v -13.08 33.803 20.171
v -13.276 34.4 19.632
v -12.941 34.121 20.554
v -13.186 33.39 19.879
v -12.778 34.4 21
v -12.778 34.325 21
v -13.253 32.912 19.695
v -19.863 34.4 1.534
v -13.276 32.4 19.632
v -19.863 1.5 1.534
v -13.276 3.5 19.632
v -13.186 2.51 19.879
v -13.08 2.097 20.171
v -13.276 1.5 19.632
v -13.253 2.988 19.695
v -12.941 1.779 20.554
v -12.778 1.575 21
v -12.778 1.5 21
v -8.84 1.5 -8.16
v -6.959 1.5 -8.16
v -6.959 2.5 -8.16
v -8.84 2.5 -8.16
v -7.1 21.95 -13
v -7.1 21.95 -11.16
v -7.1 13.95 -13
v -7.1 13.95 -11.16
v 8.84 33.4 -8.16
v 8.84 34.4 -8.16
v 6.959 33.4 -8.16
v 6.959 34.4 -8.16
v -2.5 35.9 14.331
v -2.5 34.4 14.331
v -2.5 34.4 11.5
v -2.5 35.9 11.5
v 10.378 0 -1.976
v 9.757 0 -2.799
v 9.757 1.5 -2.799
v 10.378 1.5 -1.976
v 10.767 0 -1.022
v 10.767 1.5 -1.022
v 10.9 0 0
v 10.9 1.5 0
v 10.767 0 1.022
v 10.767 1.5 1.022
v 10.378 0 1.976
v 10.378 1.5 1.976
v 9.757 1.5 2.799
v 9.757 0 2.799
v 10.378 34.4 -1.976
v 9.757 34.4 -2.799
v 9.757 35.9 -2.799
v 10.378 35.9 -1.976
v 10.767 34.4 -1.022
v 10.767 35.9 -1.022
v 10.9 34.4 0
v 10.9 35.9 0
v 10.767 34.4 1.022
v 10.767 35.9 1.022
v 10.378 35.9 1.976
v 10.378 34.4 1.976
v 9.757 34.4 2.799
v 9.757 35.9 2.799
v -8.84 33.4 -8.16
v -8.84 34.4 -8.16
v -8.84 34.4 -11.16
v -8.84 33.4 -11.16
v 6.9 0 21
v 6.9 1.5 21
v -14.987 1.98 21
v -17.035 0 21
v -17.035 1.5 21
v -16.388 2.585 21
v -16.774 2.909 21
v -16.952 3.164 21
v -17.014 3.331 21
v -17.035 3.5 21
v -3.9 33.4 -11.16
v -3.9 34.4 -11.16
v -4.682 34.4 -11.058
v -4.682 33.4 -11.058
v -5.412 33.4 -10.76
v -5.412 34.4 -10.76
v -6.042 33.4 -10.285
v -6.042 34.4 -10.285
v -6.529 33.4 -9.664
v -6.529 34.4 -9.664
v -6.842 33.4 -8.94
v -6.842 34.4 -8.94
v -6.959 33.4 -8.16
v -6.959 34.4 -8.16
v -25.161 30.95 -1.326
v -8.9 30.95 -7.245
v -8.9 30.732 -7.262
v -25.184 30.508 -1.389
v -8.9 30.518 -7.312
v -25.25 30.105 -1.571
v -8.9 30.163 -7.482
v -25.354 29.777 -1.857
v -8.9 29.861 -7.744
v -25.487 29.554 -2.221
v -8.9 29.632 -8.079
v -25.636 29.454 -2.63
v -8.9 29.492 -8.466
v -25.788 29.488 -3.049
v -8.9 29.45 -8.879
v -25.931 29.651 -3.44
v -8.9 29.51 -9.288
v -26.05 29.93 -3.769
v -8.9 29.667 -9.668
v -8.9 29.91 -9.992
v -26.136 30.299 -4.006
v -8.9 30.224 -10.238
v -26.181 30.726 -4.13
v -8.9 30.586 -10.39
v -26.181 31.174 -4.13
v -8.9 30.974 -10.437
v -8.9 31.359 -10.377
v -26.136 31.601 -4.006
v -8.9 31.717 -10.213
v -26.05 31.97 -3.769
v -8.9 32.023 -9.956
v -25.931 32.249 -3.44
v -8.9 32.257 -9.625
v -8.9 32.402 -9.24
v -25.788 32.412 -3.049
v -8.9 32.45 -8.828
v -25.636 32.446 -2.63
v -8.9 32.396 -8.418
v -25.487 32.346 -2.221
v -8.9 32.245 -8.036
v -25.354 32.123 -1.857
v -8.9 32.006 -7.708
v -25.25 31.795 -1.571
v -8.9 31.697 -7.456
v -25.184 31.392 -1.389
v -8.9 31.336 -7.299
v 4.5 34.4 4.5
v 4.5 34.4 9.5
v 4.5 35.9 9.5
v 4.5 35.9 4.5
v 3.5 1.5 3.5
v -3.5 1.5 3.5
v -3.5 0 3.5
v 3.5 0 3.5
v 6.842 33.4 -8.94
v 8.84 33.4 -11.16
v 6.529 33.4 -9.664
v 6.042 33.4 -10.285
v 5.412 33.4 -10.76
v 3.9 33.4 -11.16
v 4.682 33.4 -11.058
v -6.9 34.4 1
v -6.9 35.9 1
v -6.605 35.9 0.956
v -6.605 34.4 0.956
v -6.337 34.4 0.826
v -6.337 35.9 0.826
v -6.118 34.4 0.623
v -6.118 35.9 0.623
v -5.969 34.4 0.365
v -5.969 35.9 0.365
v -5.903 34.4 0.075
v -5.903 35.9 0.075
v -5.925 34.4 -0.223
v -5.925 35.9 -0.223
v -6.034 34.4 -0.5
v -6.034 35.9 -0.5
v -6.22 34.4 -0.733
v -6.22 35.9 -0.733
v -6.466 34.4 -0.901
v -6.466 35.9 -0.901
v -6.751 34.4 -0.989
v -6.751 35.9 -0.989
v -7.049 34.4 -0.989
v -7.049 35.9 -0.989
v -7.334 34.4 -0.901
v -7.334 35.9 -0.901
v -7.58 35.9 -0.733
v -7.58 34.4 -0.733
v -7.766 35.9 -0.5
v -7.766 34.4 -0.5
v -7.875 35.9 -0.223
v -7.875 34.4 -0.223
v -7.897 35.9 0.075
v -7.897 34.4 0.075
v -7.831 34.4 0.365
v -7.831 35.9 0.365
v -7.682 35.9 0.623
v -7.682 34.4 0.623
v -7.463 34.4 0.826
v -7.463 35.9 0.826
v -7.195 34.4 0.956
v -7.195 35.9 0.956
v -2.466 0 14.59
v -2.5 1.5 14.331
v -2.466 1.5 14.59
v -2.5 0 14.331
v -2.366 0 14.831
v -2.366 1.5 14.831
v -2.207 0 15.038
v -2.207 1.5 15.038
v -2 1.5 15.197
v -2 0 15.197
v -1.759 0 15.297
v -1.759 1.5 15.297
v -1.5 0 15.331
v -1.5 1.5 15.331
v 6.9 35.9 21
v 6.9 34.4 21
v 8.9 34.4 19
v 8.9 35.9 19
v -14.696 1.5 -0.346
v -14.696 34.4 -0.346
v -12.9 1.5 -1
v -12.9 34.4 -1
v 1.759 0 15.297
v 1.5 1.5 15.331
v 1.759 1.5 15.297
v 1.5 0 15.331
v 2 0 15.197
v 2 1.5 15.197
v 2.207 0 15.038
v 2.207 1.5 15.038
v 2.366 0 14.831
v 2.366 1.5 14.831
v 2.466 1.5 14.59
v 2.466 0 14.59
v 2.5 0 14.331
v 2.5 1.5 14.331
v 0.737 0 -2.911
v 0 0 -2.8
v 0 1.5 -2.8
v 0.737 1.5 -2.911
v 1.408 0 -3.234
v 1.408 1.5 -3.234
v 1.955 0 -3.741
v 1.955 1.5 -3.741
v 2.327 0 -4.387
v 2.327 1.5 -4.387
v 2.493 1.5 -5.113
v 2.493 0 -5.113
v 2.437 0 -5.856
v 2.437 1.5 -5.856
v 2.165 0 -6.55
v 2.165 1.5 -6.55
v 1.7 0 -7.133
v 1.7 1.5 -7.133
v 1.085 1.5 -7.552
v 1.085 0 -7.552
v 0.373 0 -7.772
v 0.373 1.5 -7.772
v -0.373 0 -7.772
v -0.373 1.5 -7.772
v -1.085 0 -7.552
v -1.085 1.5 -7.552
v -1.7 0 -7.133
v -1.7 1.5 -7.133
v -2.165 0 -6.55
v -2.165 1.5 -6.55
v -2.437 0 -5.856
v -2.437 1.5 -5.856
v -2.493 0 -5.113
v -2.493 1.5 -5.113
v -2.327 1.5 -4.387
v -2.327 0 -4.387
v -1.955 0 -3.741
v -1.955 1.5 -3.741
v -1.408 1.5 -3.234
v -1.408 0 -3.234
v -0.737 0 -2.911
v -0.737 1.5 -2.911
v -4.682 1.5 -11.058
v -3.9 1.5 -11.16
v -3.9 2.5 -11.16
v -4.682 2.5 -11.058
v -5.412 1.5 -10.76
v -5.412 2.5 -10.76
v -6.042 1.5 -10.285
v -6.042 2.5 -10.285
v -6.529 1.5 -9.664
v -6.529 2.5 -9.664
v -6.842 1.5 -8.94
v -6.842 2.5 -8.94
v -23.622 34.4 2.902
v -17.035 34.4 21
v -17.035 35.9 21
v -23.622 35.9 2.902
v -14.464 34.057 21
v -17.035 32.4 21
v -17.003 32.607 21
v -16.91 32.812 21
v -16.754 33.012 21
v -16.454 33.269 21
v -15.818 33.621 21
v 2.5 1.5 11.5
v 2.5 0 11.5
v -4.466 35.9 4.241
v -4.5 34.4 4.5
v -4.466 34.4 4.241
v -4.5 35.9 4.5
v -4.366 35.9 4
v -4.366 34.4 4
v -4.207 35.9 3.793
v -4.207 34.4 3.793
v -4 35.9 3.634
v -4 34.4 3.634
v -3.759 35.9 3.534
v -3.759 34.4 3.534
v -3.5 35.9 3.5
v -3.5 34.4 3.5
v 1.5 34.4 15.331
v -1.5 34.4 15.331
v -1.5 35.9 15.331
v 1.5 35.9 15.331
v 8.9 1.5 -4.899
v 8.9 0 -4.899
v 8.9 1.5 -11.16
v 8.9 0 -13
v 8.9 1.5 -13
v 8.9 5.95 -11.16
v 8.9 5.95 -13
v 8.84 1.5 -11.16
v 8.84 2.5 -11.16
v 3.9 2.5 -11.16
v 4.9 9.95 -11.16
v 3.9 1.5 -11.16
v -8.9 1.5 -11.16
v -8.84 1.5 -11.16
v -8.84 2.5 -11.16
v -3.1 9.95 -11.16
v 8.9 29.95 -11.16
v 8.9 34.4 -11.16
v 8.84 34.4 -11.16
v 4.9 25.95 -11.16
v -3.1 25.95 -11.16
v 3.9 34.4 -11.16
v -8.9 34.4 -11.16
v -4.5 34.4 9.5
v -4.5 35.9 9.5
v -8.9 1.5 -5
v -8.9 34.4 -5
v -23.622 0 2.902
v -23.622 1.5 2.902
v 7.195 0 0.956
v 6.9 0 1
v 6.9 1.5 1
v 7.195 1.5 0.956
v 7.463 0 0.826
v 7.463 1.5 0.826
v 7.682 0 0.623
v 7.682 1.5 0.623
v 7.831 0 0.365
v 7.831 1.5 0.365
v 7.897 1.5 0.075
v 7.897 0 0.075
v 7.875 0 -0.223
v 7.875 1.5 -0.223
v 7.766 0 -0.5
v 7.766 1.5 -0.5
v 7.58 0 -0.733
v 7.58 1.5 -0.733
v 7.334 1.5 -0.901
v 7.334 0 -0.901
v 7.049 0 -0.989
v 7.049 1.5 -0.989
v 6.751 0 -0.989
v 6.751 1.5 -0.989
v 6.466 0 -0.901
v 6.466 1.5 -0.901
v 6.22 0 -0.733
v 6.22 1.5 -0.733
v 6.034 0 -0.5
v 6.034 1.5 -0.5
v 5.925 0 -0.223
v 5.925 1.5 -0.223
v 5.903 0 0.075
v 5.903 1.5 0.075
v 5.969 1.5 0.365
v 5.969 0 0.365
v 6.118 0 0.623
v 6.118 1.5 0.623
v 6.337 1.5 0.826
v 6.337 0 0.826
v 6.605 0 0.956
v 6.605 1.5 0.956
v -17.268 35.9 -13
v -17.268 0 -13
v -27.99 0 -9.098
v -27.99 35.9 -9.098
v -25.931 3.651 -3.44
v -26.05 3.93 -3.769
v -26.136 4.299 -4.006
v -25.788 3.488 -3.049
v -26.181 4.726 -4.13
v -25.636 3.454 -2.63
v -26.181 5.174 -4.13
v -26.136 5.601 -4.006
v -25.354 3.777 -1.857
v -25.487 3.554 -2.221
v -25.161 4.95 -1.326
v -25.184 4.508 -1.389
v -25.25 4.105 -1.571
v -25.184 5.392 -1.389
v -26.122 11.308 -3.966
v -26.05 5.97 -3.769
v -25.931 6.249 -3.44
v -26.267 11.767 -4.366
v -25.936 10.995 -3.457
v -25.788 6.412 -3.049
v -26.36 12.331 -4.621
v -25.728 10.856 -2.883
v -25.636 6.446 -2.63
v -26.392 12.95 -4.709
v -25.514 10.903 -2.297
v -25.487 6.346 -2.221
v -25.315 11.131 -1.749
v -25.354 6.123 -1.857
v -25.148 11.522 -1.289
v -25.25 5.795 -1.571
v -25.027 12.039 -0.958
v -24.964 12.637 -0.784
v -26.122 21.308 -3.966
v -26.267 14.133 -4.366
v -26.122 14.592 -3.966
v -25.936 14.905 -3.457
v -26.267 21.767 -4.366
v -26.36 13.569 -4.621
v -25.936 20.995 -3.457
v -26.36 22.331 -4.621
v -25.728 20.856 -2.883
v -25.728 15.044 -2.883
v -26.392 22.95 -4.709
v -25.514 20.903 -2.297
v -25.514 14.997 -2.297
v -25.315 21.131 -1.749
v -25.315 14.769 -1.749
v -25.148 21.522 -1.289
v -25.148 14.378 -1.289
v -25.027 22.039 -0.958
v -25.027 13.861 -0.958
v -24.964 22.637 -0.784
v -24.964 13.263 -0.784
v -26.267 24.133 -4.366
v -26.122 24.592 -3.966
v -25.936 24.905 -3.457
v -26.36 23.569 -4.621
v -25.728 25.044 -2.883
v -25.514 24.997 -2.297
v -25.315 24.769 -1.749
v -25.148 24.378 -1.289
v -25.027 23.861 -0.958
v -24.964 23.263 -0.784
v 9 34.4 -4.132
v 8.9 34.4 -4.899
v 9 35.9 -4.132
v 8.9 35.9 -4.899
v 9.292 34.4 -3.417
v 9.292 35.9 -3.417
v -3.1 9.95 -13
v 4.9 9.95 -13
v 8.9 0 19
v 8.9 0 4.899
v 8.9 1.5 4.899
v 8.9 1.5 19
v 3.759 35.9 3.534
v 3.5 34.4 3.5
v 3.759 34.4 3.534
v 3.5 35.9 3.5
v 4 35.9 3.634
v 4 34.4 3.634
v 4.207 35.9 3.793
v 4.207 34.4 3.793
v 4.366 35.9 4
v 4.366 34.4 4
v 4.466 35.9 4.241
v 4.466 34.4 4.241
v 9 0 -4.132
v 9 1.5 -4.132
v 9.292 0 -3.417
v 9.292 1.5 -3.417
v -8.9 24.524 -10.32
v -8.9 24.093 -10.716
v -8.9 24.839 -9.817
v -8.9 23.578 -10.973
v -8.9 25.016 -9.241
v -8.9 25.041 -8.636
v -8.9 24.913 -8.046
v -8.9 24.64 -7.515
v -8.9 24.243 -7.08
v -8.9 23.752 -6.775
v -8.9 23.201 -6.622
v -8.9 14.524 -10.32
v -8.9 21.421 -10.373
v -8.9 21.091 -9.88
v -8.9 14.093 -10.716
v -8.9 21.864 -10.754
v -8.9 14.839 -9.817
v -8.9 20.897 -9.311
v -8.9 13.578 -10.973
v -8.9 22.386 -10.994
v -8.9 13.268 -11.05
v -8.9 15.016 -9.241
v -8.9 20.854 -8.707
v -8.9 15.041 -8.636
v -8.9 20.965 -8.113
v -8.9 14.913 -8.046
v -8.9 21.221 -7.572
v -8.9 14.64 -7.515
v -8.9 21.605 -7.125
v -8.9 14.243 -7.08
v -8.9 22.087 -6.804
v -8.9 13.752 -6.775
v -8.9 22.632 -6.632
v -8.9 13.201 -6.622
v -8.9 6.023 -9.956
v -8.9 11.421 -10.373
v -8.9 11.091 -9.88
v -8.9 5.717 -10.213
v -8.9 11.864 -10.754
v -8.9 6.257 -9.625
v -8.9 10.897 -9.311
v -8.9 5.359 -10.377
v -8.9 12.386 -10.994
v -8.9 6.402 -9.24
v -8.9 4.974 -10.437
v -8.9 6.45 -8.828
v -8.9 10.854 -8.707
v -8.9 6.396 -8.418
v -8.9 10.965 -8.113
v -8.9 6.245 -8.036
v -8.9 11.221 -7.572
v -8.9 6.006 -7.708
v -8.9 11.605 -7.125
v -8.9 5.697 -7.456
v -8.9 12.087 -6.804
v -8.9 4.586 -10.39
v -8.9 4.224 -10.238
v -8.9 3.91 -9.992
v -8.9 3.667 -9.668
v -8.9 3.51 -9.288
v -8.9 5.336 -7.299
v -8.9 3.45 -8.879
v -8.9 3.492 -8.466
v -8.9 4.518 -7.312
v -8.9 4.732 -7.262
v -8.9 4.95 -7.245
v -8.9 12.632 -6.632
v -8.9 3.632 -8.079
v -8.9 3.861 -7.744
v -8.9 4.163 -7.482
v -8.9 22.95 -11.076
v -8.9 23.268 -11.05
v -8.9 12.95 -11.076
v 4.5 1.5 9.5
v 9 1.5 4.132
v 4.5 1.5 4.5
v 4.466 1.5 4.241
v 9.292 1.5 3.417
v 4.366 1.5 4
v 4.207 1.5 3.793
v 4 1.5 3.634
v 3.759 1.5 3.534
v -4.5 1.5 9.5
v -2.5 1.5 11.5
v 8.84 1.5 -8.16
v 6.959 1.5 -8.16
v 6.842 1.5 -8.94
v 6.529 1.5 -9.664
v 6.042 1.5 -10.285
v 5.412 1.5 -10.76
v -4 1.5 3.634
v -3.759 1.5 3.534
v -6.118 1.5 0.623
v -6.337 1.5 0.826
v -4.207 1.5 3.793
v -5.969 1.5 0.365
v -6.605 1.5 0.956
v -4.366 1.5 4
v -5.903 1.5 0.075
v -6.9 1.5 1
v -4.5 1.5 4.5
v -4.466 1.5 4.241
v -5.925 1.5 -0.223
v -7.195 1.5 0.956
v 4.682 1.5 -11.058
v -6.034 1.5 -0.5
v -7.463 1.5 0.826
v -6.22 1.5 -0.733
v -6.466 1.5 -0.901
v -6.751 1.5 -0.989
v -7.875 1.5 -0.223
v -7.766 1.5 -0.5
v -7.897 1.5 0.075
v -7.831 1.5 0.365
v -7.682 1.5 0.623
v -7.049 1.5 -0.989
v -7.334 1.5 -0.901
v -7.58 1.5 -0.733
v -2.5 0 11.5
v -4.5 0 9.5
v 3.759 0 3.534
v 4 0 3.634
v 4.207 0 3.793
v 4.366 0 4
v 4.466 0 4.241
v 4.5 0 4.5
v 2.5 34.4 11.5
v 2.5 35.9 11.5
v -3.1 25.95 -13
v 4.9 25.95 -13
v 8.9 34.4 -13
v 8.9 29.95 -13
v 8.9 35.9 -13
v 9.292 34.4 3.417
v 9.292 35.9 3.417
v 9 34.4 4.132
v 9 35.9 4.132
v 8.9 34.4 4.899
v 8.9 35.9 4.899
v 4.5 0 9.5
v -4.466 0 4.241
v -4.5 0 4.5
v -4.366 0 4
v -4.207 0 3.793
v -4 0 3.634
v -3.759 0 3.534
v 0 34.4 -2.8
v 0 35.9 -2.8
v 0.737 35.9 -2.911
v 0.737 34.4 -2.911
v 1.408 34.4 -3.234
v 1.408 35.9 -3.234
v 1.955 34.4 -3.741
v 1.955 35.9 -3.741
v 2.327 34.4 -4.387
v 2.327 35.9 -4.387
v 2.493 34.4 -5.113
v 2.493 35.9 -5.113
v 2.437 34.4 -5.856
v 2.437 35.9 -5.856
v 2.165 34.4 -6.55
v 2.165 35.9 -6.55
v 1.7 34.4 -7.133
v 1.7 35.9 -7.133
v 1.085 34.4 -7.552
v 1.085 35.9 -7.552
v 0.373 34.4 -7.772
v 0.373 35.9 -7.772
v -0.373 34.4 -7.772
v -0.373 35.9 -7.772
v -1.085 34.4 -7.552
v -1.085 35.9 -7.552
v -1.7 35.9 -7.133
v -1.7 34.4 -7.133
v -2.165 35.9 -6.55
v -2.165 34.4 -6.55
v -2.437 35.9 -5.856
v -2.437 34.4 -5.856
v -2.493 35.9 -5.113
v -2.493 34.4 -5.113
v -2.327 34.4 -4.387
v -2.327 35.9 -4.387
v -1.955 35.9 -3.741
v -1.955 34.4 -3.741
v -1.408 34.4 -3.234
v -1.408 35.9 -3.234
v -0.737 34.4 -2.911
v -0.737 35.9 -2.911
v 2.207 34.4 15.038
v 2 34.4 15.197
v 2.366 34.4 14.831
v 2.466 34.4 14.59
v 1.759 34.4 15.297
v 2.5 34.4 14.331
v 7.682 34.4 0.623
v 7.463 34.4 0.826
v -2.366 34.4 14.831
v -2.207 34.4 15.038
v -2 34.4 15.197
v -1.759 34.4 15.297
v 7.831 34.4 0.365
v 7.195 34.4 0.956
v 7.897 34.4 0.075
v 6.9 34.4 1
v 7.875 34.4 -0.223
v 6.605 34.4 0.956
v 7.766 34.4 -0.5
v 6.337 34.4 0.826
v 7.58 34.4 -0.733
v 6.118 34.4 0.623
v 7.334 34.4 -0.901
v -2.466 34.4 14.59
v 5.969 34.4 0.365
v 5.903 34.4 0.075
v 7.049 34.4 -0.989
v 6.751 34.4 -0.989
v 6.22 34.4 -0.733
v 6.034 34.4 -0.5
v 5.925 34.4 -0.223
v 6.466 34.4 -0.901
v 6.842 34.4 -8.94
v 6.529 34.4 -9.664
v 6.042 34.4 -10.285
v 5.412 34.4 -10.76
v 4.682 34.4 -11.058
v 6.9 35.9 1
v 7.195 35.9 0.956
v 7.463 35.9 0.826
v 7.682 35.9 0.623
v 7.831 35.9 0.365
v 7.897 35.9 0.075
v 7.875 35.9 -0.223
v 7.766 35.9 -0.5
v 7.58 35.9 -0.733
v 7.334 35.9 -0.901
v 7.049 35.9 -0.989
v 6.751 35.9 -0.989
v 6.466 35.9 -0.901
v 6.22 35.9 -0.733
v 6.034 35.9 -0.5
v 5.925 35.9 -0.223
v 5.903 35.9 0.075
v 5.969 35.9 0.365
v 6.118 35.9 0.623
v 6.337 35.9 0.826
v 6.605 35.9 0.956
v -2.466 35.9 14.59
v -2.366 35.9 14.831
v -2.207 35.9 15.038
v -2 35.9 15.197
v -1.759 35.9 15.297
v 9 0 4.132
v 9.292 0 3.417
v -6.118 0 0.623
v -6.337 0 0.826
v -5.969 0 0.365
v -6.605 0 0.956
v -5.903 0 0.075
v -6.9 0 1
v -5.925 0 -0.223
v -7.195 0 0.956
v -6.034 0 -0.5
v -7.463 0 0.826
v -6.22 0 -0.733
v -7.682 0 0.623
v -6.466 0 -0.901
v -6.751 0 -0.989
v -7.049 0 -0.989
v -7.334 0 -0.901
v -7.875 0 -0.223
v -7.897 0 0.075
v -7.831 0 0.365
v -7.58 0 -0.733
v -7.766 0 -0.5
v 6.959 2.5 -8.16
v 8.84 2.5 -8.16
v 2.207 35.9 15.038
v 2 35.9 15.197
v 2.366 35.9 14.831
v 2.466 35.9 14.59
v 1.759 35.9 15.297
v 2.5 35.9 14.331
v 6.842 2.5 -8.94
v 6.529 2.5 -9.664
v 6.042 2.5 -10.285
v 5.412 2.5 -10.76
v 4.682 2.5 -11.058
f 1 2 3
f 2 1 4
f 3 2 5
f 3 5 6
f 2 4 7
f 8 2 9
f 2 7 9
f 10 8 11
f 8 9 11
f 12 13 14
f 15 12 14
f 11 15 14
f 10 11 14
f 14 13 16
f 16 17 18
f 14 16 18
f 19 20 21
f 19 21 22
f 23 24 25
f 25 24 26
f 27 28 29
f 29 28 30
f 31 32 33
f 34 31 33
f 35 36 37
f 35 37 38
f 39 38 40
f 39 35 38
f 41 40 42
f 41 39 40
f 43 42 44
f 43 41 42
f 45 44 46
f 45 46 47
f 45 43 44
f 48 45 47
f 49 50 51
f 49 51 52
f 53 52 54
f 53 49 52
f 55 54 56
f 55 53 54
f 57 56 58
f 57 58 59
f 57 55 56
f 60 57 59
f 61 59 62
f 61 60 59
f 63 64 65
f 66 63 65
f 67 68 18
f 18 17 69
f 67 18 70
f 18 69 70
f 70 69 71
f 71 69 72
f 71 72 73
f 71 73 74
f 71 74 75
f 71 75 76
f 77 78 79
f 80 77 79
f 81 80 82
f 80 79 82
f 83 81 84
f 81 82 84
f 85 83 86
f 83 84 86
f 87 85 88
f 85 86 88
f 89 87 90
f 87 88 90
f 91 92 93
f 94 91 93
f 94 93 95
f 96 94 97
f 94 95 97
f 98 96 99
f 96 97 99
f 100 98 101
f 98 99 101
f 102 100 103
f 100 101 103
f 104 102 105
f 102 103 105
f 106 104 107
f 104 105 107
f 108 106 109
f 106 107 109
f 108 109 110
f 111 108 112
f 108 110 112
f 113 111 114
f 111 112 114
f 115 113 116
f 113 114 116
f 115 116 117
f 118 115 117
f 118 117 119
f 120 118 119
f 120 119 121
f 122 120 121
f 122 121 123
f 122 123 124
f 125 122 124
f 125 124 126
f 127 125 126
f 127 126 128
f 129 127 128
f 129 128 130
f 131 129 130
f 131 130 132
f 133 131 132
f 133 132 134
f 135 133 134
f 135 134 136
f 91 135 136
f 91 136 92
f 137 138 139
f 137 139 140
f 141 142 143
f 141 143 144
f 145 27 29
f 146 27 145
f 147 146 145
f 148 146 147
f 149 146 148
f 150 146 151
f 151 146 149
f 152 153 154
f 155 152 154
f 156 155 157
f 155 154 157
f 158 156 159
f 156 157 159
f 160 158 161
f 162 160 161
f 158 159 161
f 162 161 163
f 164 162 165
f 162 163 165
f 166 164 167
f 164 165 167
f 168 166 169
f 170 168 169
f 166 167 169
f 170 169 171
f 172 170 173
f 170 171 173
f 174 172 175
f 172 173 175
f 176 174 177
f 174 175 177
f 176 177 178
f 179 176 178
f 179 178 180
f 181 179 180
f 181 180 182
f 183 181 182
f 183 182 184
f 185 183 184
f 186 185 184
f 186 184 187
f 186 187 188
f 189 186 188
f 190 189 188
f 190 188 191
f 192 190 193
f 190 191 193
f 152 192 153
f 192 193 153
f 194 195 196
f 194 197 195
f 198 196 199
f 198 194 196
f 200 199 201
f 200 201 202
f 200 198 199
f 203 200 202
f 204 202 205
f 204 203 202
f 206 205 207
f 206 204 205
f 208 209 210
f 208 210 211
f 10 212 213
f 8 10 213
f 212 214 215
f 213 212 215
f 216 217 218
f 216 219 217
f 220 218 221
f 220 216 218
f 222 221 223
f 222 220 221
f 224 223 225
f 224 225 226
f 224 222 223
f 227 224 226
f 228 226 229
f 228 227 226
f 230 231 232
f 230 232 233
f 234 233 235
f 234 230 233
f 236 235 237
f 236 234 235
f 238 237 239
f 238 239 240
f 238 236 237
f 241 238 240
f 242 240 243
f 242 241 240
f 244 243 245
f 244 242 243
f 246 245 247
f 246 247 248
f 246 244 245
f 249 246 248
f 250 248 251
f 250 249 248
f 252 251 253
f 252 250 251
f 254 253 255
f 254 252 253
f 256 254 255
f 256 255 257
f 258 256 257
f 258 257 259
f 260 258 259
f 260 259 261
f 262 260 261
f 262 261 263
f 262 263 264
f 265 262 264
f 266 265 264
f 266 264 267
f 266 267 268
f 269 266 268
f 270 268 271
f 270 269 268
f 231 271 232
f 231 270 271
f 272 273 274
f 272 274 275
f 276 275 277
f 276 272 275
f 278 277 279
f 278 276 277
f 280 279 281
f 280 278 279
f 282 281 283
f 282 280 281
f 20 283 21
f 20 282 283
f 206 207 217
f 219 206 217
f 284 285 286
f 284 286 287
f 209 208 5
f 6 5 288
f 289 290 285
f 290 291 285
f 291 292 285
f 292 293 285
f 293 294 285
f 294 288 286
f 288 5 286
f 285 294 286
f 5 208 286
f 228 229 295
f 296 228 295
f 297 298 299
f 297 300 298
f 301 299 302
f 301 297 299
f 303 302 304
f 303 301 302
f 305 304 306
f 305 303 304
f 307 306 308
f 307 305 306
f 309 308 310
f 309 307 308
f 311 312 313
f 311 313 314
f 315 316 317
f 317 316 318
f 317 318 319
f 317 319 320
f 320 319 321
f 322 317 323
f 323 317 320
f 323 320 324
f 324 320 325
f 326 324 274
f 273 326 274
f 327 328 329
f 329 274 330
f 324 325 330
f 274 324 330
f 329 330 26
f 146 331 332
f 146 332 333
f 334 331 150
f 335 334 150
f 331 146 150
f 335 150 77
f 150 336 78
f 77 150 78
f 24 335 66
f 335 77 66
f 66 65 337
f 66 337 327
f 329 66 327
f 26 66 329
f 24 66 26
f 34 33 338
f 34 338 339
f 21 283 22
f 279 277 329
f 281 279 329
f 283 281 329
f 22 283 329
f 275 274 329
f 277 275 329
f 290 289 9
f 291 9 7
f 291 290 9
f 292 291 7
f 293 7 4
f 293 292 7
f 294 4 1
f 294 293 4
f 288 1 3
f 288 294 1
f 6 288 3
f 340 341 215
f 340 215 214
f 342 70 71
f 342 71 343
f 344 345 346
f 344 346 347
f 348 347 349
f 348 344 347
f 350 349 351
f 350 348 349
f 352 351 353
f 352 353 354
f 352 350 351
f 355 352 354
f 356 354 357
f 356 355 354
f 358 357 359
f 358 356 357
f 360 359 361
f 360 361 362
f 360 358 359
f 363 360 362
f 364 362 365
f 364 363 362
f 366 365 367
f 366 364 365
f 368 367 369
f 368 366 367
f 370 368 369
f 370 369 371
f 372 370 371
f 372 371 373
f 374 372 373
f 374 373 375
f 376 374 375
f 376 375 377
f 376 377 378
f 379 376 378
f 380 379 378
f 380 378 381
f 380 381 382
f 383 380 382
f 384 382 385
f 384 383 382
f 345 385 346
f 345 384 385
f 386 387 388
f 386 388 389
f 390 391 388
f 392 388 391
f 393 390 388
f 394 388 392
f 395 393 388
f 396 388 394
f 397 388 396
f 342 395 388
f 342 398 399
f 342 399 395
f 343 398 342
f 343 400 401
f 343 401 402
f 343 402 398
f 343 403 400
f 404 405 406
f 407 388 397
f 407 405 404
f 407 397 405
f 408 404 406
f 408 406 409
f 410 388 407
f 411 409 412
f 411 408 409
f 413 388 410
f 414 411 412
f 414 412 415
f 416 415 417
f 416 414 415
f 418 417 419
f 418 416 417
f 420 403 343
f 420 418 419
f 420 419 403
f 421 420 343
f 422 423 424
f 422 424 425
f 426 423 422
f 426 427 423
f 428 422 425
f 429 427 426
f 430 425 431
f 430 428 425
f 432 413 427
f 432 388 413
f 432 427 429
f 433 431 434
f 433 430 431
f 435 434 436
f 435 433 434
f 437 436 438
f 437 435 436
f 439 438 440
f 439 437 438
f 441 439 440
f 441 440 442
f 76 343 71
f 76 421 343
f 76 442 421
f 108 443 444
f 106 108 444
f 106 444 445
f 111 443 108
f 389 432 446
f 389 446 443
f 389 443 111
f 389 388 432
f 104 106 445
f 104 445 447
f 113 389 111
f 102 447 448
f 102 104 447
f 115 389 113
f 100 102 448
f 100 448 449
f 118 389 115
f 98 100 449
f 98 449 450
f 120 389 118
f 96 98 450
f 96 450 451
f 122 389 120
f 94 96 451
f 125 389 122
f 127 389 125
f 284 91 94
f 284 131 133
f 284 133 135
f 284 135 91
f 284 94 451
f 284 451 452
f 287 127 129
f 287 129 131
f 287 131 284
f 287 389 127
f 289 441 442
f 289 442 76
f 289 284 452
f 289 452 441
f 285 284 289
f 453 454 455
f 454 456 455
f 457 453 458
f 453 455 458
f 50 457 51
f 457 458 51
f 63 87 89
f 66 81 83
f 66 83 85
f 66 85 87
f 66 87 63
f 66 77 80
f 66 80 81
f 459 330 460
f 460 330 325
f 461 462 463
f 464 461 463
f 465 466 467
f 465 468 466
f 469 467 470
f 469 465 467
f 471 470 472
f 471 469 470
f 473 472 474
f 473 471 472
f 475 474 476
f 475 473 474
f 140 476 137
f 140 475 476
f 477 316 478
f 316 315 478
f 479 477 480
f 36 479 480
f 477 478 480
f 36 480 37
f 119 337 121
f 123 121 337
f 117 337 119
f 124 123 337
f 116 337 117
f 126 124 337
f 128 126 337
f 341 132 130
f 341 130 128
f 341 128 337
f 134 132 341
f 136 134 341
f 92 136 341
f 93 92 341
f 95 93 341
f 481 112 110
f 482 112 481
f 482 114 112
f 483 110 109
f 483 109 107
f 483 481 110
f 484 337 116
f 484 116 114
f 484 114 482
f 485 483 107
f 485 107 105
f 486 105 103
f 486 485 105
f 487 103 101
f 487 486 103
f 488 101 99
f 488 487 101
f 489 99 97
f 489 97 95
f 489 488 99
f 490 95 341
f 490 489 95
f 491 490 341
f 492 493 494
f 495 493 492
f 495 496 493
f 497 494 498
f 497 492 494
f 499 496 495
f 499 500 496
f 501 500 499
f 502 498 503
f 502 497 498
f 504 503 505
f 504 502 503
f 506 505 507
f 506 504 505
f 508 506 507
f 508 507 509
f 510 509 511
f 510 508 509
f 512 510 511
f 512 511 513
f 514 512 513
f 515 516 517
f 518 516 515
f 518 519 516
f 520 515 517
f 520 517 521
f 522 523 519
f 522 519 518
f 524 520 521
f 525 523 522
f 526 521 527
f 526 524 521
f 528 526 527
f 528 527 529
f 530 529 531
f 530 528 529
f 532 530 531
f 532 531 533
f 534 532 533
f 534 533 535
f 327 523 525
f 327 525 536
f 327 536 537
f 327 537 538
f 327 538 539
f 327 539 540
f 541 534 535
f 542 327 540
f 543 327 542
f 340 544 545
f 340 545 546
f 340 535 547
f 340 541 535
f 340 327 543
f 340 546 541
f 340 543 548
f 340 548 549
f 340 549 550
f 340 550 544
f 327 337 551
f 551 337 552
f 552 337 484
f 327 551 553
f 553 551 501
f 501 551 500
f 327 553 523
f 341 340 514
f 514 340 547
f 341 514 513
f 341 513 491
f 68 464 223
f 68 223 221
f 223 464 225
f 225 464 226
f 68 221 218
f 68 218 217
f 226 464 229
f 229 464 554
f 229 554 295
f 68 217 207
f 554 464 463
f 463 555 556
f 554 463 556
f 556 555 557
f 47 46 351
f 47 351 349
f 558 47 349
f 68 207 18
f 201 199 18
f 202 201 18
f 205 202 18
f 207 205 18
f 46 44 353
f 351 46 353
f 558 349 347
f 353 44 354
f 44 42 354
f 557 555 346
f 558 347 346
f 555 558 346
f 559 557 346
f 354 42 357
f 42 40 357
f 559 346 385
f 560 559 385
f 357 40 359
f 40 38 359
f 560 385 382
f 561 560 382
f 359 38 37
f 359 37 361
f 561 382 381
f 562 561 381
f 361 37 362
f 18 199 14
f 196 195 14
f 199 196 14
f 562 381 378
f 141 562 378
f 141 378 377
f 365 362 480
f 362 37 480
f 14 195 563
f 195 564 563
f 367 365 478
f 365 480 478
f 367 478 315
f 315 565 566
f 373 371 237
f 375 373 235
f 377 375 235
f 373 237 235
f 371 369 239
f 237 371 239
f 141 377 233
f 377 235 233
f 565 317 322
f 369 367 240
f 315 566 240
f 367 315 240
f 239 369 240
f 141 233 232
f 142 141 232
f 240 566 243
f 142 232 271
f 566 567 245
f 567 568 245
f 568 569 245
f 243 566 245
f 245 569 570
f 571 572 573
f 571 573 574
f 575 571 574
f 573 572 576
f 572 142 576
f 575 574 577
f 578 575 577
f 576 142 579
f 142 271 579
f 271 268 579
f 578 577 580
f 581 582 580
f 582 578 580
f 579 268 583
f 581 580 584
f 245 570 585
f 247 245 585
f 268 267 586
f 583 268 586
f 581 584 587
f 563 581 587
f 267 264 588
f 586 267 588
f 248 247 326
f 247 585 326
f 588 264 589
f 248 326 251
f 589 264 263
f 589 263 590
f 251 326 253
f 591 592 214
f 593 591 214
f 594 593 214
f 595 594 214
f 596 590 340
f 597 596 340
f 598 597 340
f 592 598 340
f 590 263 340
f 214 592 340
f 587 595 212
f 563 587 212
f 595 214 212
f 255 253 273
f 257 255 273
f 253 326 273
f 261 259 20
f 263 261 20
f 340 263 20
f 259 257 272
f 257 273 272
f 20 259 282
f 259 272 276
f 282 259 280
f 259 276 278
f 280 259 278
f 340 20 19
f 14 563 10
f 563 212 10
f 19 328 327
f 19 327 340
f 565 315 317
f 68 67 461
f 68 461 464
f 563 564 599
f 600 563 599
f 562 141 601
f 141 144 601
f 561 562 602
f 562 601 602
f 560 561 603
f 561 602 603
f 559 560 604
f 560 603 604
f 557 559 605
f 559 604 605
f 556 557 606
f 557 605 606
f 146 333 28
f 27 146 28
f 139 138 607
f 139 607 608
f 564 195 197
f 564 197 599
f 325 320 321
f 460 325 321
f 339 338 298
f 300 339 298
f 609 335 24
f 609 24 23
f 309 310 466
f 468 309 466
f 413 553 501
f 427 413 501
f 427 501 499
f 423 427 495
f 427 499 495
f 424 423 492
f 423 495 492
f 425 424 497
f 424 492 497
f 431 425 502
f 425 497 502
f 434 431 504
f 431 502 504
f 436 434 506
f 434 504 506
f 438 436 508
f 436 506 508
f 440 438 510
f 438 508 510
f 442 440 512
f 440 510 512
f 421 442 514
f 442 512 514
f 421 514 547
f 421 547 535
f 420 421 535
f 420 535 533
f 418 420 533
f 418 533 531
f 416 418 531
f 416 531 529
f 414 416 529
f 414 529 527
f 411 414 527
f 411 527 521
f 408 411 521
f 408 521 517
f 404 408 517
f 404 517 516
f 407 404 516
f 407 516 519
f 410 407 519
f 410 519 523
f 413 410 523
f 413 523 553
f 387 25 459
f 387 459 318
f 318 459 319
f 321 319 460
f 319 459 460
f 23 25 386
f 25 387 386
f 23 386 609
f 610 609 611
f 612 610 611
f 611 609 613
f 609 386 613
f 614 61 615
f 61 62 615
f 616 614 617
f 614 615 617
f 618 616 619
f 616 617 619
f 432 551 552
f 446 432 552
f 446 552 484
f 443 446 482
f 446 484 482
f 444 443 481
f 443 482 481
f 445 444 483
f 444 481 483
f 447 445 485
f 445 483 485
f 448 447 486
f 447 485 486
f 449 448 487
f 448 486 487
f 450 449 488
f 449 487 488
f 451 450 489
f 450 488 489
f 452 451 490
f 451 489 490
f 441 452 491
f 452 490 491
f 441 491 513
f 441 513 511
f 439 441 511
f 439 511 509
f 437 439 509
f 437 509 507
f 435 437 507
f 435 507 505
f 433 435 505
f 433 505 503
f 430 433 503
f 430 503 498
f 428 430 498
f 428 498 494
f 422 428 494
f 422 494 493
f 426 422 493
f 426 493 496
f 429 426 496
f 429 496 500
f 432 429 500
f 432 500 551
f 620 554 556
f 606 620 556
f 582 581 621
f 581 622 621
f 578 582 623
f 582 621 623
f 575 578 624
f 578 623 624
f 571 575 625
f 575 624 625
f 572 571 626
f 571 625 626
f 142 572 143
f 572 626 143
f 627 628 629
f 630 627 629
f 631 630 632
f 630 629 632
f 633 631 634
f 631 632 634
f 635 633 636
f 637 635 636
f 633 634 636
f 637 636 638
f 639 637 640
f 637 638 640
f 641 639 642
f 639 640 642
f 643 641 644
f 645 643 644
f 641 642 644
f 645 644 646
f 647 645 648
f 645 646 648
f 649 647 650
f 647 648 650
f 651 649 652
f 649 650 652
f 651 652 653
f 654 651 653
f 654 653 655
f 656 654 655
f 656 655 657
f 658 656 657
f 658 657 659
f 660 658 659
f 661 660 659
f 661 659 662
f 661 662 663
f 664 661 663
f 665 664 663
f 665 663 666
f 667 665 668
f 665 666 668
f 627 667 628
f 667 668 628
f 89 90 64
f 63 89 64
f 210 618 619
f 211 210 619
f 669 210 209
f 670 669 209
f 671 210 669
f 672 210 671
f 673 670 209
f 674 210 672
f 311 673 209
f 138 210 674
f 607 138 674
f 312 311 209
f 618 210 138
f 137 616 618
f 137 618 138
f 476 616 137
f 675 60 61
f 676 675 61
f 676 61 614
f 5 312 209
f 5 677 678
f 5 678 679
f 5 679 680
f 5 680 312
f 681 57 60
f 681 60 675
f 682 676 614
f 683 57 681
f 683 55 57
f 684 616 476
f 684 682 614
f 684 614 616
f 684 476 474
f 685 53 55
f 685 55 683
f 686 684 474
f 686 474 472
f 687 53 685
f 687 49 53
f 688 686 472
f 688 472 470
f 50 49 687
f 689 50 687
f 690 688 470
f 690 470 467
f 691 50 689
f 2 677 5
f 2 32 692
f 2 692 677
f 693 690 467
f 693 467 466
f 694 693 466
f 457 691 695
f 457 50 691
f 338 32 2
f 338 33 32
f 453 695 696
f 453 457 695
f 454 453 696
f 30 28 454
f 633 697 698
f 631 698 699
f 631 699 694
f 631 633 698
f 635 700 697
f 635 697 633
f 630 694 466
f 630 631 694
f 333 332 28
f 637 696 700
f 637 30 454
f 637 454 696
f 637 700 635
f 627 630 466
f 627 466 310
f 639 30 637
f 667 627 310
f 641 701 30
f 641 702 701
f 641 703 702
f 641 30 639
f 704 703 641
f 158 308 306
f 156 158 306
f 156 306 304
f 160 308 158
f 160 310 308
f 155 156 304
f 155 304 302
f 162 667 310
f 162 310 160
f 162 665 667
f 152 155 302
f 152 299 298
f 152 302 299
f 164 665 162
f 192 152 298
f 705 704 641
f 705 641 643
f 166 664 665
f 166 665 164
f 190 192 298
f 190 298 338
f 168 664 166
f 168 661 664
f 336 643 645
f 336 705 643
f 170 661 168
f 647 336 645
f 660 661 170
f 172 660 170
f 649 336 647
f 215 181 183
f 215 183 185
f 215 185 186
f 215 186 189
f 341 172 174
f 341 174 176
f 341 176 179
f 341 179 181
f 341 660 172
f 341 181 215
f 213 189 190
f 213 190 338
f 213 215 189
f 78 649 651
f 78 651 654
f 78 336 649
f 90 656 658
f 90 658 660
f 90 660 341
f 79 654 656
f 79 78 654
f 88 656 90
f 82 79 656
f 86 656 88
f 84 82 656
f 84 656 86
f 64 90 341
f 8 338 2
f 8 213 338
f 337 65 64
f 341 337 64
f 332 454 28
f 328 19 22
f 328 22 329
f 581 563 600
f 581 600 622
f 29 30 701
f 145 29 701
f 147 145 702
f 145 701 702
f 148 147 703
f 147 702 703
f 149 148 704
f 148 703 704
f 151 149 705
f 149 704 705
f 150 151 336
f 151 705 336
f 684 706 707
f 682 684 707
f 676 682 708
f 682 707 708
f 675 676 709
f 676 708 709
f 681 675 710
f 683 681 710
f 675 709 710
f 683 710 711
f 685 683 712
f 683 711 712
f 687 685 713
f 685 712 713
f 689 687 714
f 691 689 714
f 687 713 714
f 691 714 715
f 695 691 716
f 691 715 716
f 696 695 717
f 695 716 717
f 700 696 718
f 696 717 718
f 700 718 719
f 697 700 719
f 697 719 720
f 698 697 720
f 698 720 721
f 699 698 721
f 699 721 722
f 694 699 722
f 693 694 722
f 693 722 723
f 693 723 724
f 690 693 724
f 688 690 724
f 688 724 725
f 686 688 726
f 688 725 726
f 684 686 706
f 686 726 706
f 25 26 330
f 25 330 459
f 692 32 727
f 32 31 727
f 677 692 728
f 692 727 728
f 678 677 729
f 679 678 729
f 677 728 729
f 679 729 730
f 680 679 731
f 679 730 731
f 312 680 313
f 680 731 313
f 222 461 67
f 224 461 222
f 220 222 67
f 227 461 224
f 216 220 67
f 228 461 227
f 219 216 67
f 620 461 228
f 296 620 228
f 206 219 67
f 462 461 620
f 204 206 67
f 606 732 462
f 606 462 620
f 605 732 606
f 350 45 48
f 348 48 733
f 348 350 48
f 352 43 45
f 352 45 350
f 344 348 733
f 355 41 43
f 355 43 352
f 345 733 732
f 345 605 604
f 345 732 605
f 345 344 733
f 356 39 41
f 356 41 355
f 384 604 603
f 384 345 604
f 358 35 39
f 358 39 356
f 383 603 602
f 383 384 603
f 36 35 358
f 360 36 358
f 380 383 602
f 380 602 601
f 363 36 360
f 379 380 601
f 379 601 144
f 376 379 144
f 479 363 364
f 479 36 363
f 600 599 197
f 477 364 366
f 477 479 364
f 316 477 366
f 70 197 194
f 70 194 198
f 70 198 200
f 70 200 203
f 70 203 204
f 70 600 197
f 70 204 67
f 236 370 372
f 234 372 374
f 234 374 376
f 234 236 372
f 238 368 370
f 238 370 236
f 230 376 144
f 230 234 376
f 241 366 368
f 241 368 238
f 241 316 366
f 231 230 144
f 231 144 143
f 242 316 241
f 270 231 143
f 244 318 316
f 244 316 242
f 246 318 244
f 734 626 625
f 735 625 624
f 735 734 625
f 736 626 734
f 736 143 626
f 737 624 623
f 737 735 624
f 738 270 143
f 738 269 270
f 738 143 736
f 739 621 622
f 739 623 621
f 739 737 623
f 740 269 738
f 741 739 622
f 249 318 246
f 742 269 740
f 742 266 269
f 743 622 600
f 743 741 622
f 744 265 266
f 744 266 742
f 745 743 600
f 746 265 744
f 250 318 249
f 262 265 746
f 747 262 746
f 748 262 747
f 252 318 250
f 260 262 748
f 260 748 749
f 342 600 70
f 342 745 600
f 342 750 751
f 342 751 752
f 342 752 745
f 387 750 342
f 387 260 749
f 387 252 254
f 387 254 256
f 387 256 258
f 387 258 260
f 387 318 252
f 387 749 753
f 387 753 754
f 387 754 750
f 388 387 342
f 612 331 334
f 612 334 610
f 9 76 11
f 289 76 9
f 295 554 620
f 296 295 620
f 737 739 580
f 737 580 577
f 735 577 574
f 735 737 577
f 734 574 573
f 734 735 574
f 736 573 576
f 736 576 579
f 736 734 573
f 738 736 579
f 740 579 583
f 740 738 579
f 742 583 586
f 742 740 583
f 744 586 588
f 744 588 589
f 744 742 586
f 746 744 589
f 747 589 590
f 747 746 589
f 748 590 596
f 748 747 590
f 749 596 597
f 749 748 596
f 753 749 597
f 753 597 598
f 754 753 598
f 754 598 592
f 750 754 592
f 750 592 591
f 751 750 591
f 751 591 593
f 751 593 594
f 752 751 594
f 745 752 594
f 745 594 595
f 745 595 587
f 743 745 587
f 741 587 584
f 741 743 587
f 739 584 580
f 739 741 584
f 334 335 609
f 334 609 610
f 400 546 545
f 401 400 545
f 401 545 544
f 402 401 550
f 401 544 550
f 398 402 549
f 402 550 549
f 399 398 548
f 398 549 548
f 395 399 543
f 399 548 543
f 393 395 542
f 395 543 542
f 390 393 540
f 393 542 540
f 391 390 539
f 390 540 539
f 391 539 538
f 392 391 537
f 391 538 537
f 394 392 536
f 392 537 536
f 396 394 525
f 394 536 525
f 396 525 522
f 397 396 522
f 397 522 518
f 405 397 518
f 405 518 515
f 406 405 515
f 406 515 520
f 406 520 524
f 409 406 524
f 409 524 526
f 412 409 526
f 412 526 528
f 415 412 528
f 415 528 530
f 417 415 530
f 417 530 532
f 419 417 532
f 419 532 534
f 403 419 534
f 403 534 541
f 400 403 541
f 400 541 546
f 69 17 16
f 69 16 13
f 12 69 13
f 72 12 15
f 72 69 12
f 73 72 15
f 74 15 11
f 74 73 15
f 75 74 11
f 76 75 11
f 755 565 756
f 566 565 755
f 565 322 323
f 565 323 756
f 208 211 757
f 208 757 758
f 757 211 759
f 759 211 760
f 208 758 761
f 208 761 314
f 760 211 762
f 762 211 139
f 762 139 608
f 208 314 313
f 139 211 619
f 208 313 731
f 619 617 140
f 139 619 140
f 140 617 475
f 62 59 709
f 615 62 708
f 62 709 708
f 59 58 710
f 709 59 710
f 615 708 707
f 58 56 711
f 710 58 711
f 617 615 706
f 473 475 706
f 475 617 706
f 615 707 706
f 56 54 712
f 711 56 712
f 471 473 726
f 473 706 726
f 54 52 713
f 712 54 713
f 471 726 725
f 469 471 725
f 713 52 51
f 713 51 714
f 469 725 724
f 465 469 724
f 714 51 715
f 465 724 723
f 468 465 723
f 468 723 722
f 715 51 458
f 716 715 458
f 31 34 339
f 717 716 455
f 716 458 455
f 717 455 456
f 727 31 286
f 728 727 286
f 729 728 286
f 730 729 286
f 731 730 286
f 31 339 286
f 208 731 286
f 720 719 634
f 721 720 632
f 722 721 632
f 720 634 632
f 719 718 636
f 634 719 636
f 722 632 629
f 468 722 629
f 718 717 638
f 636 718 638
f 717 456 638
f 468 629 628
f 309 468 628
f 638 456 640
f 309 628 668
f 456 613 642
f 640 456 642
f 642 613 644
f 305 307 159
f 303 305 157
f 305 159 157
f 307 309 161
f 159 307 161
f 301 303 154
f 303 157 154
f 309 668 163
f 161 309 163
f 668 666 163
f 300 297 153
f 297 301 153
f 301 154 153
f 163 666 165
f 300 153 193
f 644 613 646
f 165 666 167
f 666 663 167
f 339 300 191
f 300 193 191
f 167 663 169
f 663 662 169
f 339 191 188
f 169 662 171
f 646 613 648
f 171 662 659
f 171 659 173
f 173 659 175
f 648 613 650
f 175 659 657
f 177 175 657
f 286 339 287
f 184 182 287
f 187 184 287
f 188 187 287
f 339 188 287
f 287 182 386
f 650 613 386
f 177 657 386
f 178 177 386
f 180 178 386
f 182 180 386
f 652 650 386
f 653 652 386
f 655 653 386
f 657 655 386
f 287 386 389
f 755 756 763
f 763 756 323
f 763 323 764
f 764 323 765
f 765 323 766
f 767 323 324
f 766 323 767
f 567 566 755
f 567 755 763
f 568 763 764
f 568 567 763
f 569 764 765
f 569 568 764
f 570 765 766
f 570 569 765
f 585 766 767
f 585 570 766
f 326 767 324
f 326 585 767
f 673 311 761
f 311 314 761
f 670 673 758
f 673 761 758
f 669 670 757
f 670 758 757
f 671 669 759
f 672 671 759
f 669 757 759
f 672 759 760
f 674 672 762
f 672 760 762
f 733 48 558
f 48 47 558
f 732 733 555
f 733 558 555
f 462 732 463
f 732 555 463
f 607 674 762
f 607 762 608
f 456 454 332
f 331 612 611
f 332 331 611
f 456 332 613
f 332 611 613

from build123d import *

# Parameters (mm, degrees)
SKETCH1_W                  = 17.8
SKETCH1_H                  = 30
SKETCH1_R                  = 1
SKETCH1_R_2                = 2.5
BOSS_EXTRUDE1_DEPTH        = 1.5
SKETCH2_W                  = 9
SKETCH2_H                  = 6
SKETCH2_W_2                = 5
SKETCH2_H_2                = 5.830943002
CUT_EXTRUDE1_DEPTH         = 20.247337478
CHAMFER1_SIZE              = 2
FILLET1_R                  = 1
BOSS_EXTRUDE2_DEPTH        = 1
SKETCH4_W                  = 12
SKETCH4_H                  = 17.95
BOSS_EXTRUDE3_DEPTH        = 4
BOSS_EXTRUDE4_DEPTH        = 35.9
SKETCH6_W                  = 12.770133269
SKETCH6_H                  = 35.9
BOSS_EXTRUDE5_DEPTH        = 11.41
F_3_0_MM_DOWEL_HOLES1_D    = 3
F_4_2_4_2_DIAMETER_HOLE1_D = 4.2
SKETCH12_W                 = 17.8
SKETCH12_H                 = 1.5
BOSS_EXTRUDE6_DEPTH        = 4
CHAMFER2_SIZE              = 2
SKETCH13_W                 = 26.167642811
SKETCH13_H                 = 35.9
BOSS_EXTRUDE7_DEPTH        = 1.840000002
CHAMFER3_SIZE              = 4
CHAMFER4_SIZE              = 4
SKETCH14_W                 = 16
SKETCH14_H                 = 8
CUT_EXTRUDE2_DEPTH         = 56.735892419
CHAMFER5_SIZE              = 4
BOSS_EXTRUDE8_DEPTH        = 1.5
BOSS_EXTRUDE9_START        = -34.4
BOSS_EXTRUDE9_DEPTH        = 1.5
FILLET2_R                  = 3
BOSS_EXTRUDE10_START       = -1.5
BOSS_EXTRUDE10_DEPTH       = 1.5
BOSS_EXTRUDE11_START       = -35.9
BOSS_EXTRUDE11_DEPTH       = 1.5
SKETCH18_W                 = 19.259010622
SKETCH18_H                 = 32.9
BOSS_EXTRUDE12_DEPTH       = 4
FILLET3_R                  = 2


# Some blends are built 0.0001 mm under size
with BuildPart() as part:
    # Sketch1 → Boss-Extrude1 (new body)
    with BuildSketch(Plane(origin=(0, 0, 0), x_dir=(1, 0, 0), z_dir=(0, 1, 0))):
        with Locations((0, -2)):
            Rectangle(SKETCH1_W, SKETCH1_H)
        with Locations(Location((-6.9, 0, 0), (0, 0, 270))):
            Circle(SKETCH1_R, mode=Mode.SUBTRACT)
        with Locations(Location((6.9, 0, 0), (0, 0, 270))):
            Circle(SKETCH1_R, mode=Mode.SUBTRACT)
        with Locations(Location((0, 5.3, 0), (0, 0, 270))):
            Circle(SKETCH1_R_2, mode=Mode.SUBTRACT)
    extrude(amount=BOSS_EXTRUDE1_DEPTH)

    # Sketch2 → Cut-Extrude1 (cut, through all)
    with BuildSketch(Plane(origin=(0, 1.5, 0), x_dir=(1, 0, 0), z_dir=(0, 1, 0))):
        with Locations((0, -6.5)):
            Rectangle(SKETCH2_W, SKETCH2_H)
        with Locations((0, -12.415471501)):
            Rectangle(SKETCH2_W_2, SKETCH2_H_2)
    extrude(amount=-CUT_EXTRUDE1_DEPTH, mode=Mode.SUBTRACT)

    # Chamfer1
    chamfer1_edges = [part.edges().sort_by_distance(p)[0] for p in [
        (2.5, 0.75, 9.5),
        (-2.5, 0.75, 9.5),
    ]]
    chamfer(chamfer1_edges, length=CHAMFER1_SIZE - 0.0001)  # a hair under: the kernel refuses the full size

    # Fillet1
    fillet1_edges = [part.edges().sort_by_distance(p)[0] for p in [
        (4.5, 0.75, 3.5),
        (2.5, 0.75, 15.330943002),
        (-2.5, 0.75, 15.330943002),
        (-4.5, 0.75, 3.5),
    ]]
    fillet(fillet1_edges, radius=FILLET1_R)

    # Sketch3 → Boss-Extrude2 (add)
    with BuildSketch(Plane(origin=(0, 1.5, 0), x_dir=(1, 0, 0), z_dir=(0, 1, 0))):
        with BuildLine():
            Line((8.84, 8.16), (6.959390471, 8.16))
            ThreePointArc((6.959390471, 8.16), (6.042112051, 10.284532913), (3.900010938, 11.159999998))
            Line((3.900010938, 11.159999998), (-3.900010938, 11.159999998))
            ThreePointArc((-3.900010938, 11.159999998), (-6.04211205, 10.284532912), (-6.959390471, 8.16))
            Line((-6.959390471, 8.16), (-8.84, 8.16))
            Line((-8.84, 8.16), (-8.84, 12.94))
            Line((-8.84, 12.94), (8.84, 12.94))
            Line((8.84, 12.94), (8.84, 8.16))
        make_face()
    extrude(amount=BOSS_EXTRUDE2_DEPTH)

    # Sketch4 → Boss-Extrude3 (add)
    with BuildSketch(Plane.ZY.offset(8.9)):
        with Locations((-7, 8.975)):
            Rectangle(SKETCH4_W, SKETCH4_H)
    extrude(amount=BOSS_EXTRUDE3_DEPTH)

    # Mirror2: part across plane


with BuildPart() as part_1:
    add(part.part)
    add(part.part.mirror(Plane.ZX.offset(17.95)))

    # Sketch5 → Boss-Extrude4 (add)
    with BuildSketch(Plane(origin=(0, 35.9, 0), x_dir=(1, 0, 0), z_dir=(0, 1, 0))):
        Polygon((-12.9, 1), (-17.267642811, 13), (-12.9, 13), align=None)
    extrude(amount=-BOSS_EXTRUDE4_DEPTH)

    # Sketch6 → Boss-Extrude5 (add)
    with BuildSketch(Plane(origin=(-11.069592853, 0, 4.029002304), x_dir=(0.3420201433256634, 0, 0.9396926207859103), z_dir=(-0.9396926207859103, 0, 0.3420201433256634))):
        with Locations((-11.736819105, 17.95)):
            Rectangle(SKETCH6_W, SKETCH6_H)
    extrude(amount=BOSS_EXTRUDE5_DEPTH)

    # Ø3.0 mm Dowel Holes1 (through all)
    with Locations(Plane(origin=(-23.72675034, 0, 2.614356121), x_dir=(-0.34202014332566333, 0, -0.9396926207859103), z_dir=(-0.9396926207859104, 0, 0.3420201433256634))):
        with Locations((5.693417073, -4.95), (5.693417073, -30.95)):
            Hole(F_3_0_MM_DOWEL_HOLES1_D / 2)

    # Ø4.2 (4.2) Diameter Hole1 (through all)
    with Locations(Plane(origin=(-21.791485656, 0, 7.931452139), x_dir=(0.34202014332566333, 0, 0.9396926207859103), z_dir=(-0.9396926207859104, 0, 0.3420201433256634))):
        with Locations((-11.35175247, 12.95), (-11.35175247, 22.95)):
            Hole(F_4_2_4_2_DIAMETER_HOLE1_D / 2)

    # Sketch12 → Boss-Extrude6 (add)
    with BuildSketch(Plane.XY.offset(17)):
        with Locations((0, 35.15)):
            Rectangle(SKETCH12_W, SKETCH12_H)
        with Locations((0, 0.75)):
            Rectangle(SKETCH12_W, SKETCH12_H)
    extrude(amount=BOSS_EXTRUDE6_DEPTH)

    # Chamfer2
    chamfer2_edges = [part_1.edges().sort_by_distance(p)[0] for p in [
        (8.9, 35.15, 21),
        (-8.9, 35.15, 21),
        (-8.9, 0.75, 21),
        (8.9, 0.75, 21),
    ]]
    chamfer(chamfer2_edges, length=CHAMFER2_SIZE)

    # Sketch13 → Boss-Extrude7 (add)
    with BuildSketch(Plane(origin=(0, 0, -13), x_dir=(-1, 0, 0), z_dir=(0, 0, -1))):
        with Locations((4.183821406, 17.95)):
            Rectangle(SKETCH13_W, SKETCH13_H)
    extrude(amount=-BOSS_EXTRUDE7_DEPTH)

    # Chamfer3
    # the kernel refuses this chamfer: 4 mm, written as the material it adds along each edge
    with BuildSketch(Plane(origin=(-8.9, 0, -1), x_dir=(-0.9996219169112968, 0, -0.027495876610586216), z_dir=(0, 1, 0)), Plane(origin=(-8.9, 35.9, -1), x_dir=(0.027495876610586924, 0, 0.9996219169112968), z_dir=(0, -1, 0))) as chamfer3_piece_1:
        Polygon((CHAMFER3_SIZE * 0.999621916911, CHAMFER3_SIZE * 0.0274958766106), (-CHAMFER3_SIZE * 0.0274958766106, CHAMFER3_SIZE * 0.999621916911), (0, 0), align=None)
    extrude(amount=1.5)

    # Chamfer4
    chamfer4_edges = [part_1.edges().sort_by_distance(p)[0] for p in [
        (-8.9, 17.95, -1),
    ]]
    chamfer(chamfer4_edges, length=CHAMFER4_SIZE - 0.0001)  # a hair under: the kernel refuses the full size

    # Sketch14 → Cut-Extrude2 (cut, through all)
    with BuildSketch(Plane.XY.offset(-11.159999998)):
        with Locations((0.9, 21.95)):
            Rectangle(SKETCH14_W, SKETCH14_H)
        with Locations((0.9, 13.95)):
            Rectangle(SKETCH14_W, SKETCH14_H)
    extrude(amount=-CUT_EXTRUDE2_DEPTH, mode=Mode.SUBTRACT)

    # Chamfer5
    chamfer5_edges = [part_1.edges().sort_by_distance(p)[0] for p in [
        (-7.1, 9.95, -12.079999999),
        (-7.1, 25.95, -12.079999999),
        (8.9, 25.95, -12.079999999),
        (8.9, 9.95, -12.079999999),
    ]]
    chamfer(chamfer5_edges, length=CHAMFER5_SIZE)

    # Sketch15 → Boss-Extrude8 (add)
    with BuildSketch(Plane.XZ):
        with BuildLine():
            Line((8.9, 3.464101615), (8.9, -3.464101615))
            ThreePointArc((8.9, -3.464101615), (10.9, 0), (8.9, 3.464101615))
        make_face()
    extrude(amount=-BOSS_EXTRUDE8_DEPTH)

    # Sketch15<2> → Boss-Extrude9 (add)
    with BuildSketch(Plane.XZ.offset(BOSS_EXTRUDE9_START)):
        with BuildLine():
            Line((8.9, 3.464101615), (8.9, -3.464101615))
            ThreePointArc((8.9, -3.464101615), (10.9, 0), (8.9, 3.464101615))
        make_face()
    extrude(amount=-BOSS_EXTRUDE9_DEPTH)

    # Fillet2
    fillet2_edges = [part_1.edges().sort_by_distance(p)[0] for p in [
        (-12.9, 0.75, -1),
        (-12.9, 35.15, -1),
        (-8.9, 0.75, 3),
        (-8.9, 35.15, 3),
        (8.9, 0.75, -3.464101615),
        (8.9, 0.75, 3.464101615),
        (8.9, 35.15, 3.464101615),
        (8.9, 35.15, -3.464101615),
    ]]
    fillet(fillet2_edges, radius=FILLET2_R)

    # Sketch16 → Boss-Extrude10 (add)
    with BuildSketch(Plane(origin=(0, 35.9, 0), x_dir=(1, 0, 0), z_dir=(0, 1, 0)).offset(BOSS_EXTRUDE10_START)):
        with BuildLine():
            Line((-8.9, -4.242640687), (-8.9, -19))
            Line((-8.9, -19), (-6.9, -21))
            Line((-6.9, -21), (-17.03492323, -21))
            Line((-17.03492323, -21), (-23.621892803, -2.902449835))
            Line((-23.621892803, -2.902449835), (-14.695950669, 0.346327414))
            ThreePointArc((-14.695950669, 0.346327414), (-13.020571397, 0.456137573), (-11.548569895, -0.351430105))
            Line((-11.548569895, -0.351430105), (-9.778679656, -2.121320344))
            ThreePointArc((-9.778679656, -2.121320344), (-9.128361402, -3.09459039), (-8.9, -4.242640687))
        make_face()
    extrude(amount=BOSS_EXTRUDE10_DEPTH)

    # Sketch16<2> → Boss-Extrude11 (add)
    with BuildSketch(Plane(origin=(0, 35.9, 0), x_dir=(1, 0, 0), z_dir=(0, 1, 0)).offset(BOSS_EXTRUDE11_START)):
        with BuildLine():
            Line((-8.9, -4.242640687), (-8.9, -19))
            Line((-8.9, -19), (-6.9, -21))
            Line((-6.9, -21), (-17.03492323, -21))
            Line((-17.03492323, -21), (-23.621892803, -2.902449835))
            Line((-23.621892803, -2.902449835), (-14.695950669, 0.346327414))
            ThreePointArc((-14.695950669, 0.346327414), (-13.020571397, 0.456137573), (-11.548569895, -0.351430105))
            Line((-11.548569895, -0.351430105), (-9.778679656, -2.121320344))
            ThreePointArc((-9.778679656, -2.121320344), (-9.128361402, -3.09459039), (-8.9, -4.242640687))
        make_face()
    extrude(amount=BOSS_EXTRUDE11_DEPTH)

    # Sketch18 → Boss-Extrude12 (add)
    with BuildSketch(Plane(origin=(-21.791485656, 0, 7.931452139), x_dir=(0.34202014332566333, 0, 0.9396926207859103), z_dir=(-0.9396926207859104, 0, 0.3420201433256634))):
        with Locations((4.277752841, 17.95)):
            Rectangle(SKETCH18_W, SKETCH18_H)
    extrude(amount=-BOSS_EXTRUDE12_DEPTH)

    # Fillet3
    # the kernel refuses this fillet: 2 mm, written as the material it adds along each edge
    with BuildSketch(Plane(origin=(-21.733386334, 34.4, 22.710100717), x_dir=(0.3420201433256634, 0, 0.9396926207859104), z_dir=(0.9396926207859104, 0, -0.3420201433256634))) as fillet3_piece_1_section:
        with BuildLine():
            CenterArc((FILLET3_R, FILLET3_R), FILLET3_R, 180, 90)
            Line((0, FILLET3_R), (0, 0))
            Line((0, 0), (FILLET3_R, 0))
        make_face()
    fillet3_piece_1 = extrude(amount=9, mode=Mode.PRIVATE)
    fillet3_piece_1 = split(fillet3_piece_1, bisect_by=Plane(origin=(-14.648893953, 33.872369462, 21), z_dir=(0, 0, -1)), keep=Keep.TOP, mode=Mode.PRIVATE)
    add(fillet3_piece_1)
    with BuildSketch(Plane(origin=(-21.733386334, 1.5, 22.710100717), x_dir=(0, 1, 0), z_dir=(0.9396926207859104, 0, -0.3420201433256634))) as fillet3_piece_2_section:
        with BuildLine():
            CenterArc((FILLET3_R, FILLET3_R), FILLET3_R, 180, 90)
            Line((0, FILLET3_R), (0, 0))
            Line((0, 0), (FILLET3_R, 0))
        make_face()
    fillet3_piece_2 = extrude(amount=9, mode=Mode.PRIVATE)
    fillet3_piece_2 = split(fillet3_piece_2, bisect_by=Plane(origin=(-14.648893954, 2.027630538, 21), z_dir=(0, 0, -1)), keep=Keep.TOP, mode=Mode.PRIVATE)
    add(fillet3_piece_2)


solid = part_1.part
